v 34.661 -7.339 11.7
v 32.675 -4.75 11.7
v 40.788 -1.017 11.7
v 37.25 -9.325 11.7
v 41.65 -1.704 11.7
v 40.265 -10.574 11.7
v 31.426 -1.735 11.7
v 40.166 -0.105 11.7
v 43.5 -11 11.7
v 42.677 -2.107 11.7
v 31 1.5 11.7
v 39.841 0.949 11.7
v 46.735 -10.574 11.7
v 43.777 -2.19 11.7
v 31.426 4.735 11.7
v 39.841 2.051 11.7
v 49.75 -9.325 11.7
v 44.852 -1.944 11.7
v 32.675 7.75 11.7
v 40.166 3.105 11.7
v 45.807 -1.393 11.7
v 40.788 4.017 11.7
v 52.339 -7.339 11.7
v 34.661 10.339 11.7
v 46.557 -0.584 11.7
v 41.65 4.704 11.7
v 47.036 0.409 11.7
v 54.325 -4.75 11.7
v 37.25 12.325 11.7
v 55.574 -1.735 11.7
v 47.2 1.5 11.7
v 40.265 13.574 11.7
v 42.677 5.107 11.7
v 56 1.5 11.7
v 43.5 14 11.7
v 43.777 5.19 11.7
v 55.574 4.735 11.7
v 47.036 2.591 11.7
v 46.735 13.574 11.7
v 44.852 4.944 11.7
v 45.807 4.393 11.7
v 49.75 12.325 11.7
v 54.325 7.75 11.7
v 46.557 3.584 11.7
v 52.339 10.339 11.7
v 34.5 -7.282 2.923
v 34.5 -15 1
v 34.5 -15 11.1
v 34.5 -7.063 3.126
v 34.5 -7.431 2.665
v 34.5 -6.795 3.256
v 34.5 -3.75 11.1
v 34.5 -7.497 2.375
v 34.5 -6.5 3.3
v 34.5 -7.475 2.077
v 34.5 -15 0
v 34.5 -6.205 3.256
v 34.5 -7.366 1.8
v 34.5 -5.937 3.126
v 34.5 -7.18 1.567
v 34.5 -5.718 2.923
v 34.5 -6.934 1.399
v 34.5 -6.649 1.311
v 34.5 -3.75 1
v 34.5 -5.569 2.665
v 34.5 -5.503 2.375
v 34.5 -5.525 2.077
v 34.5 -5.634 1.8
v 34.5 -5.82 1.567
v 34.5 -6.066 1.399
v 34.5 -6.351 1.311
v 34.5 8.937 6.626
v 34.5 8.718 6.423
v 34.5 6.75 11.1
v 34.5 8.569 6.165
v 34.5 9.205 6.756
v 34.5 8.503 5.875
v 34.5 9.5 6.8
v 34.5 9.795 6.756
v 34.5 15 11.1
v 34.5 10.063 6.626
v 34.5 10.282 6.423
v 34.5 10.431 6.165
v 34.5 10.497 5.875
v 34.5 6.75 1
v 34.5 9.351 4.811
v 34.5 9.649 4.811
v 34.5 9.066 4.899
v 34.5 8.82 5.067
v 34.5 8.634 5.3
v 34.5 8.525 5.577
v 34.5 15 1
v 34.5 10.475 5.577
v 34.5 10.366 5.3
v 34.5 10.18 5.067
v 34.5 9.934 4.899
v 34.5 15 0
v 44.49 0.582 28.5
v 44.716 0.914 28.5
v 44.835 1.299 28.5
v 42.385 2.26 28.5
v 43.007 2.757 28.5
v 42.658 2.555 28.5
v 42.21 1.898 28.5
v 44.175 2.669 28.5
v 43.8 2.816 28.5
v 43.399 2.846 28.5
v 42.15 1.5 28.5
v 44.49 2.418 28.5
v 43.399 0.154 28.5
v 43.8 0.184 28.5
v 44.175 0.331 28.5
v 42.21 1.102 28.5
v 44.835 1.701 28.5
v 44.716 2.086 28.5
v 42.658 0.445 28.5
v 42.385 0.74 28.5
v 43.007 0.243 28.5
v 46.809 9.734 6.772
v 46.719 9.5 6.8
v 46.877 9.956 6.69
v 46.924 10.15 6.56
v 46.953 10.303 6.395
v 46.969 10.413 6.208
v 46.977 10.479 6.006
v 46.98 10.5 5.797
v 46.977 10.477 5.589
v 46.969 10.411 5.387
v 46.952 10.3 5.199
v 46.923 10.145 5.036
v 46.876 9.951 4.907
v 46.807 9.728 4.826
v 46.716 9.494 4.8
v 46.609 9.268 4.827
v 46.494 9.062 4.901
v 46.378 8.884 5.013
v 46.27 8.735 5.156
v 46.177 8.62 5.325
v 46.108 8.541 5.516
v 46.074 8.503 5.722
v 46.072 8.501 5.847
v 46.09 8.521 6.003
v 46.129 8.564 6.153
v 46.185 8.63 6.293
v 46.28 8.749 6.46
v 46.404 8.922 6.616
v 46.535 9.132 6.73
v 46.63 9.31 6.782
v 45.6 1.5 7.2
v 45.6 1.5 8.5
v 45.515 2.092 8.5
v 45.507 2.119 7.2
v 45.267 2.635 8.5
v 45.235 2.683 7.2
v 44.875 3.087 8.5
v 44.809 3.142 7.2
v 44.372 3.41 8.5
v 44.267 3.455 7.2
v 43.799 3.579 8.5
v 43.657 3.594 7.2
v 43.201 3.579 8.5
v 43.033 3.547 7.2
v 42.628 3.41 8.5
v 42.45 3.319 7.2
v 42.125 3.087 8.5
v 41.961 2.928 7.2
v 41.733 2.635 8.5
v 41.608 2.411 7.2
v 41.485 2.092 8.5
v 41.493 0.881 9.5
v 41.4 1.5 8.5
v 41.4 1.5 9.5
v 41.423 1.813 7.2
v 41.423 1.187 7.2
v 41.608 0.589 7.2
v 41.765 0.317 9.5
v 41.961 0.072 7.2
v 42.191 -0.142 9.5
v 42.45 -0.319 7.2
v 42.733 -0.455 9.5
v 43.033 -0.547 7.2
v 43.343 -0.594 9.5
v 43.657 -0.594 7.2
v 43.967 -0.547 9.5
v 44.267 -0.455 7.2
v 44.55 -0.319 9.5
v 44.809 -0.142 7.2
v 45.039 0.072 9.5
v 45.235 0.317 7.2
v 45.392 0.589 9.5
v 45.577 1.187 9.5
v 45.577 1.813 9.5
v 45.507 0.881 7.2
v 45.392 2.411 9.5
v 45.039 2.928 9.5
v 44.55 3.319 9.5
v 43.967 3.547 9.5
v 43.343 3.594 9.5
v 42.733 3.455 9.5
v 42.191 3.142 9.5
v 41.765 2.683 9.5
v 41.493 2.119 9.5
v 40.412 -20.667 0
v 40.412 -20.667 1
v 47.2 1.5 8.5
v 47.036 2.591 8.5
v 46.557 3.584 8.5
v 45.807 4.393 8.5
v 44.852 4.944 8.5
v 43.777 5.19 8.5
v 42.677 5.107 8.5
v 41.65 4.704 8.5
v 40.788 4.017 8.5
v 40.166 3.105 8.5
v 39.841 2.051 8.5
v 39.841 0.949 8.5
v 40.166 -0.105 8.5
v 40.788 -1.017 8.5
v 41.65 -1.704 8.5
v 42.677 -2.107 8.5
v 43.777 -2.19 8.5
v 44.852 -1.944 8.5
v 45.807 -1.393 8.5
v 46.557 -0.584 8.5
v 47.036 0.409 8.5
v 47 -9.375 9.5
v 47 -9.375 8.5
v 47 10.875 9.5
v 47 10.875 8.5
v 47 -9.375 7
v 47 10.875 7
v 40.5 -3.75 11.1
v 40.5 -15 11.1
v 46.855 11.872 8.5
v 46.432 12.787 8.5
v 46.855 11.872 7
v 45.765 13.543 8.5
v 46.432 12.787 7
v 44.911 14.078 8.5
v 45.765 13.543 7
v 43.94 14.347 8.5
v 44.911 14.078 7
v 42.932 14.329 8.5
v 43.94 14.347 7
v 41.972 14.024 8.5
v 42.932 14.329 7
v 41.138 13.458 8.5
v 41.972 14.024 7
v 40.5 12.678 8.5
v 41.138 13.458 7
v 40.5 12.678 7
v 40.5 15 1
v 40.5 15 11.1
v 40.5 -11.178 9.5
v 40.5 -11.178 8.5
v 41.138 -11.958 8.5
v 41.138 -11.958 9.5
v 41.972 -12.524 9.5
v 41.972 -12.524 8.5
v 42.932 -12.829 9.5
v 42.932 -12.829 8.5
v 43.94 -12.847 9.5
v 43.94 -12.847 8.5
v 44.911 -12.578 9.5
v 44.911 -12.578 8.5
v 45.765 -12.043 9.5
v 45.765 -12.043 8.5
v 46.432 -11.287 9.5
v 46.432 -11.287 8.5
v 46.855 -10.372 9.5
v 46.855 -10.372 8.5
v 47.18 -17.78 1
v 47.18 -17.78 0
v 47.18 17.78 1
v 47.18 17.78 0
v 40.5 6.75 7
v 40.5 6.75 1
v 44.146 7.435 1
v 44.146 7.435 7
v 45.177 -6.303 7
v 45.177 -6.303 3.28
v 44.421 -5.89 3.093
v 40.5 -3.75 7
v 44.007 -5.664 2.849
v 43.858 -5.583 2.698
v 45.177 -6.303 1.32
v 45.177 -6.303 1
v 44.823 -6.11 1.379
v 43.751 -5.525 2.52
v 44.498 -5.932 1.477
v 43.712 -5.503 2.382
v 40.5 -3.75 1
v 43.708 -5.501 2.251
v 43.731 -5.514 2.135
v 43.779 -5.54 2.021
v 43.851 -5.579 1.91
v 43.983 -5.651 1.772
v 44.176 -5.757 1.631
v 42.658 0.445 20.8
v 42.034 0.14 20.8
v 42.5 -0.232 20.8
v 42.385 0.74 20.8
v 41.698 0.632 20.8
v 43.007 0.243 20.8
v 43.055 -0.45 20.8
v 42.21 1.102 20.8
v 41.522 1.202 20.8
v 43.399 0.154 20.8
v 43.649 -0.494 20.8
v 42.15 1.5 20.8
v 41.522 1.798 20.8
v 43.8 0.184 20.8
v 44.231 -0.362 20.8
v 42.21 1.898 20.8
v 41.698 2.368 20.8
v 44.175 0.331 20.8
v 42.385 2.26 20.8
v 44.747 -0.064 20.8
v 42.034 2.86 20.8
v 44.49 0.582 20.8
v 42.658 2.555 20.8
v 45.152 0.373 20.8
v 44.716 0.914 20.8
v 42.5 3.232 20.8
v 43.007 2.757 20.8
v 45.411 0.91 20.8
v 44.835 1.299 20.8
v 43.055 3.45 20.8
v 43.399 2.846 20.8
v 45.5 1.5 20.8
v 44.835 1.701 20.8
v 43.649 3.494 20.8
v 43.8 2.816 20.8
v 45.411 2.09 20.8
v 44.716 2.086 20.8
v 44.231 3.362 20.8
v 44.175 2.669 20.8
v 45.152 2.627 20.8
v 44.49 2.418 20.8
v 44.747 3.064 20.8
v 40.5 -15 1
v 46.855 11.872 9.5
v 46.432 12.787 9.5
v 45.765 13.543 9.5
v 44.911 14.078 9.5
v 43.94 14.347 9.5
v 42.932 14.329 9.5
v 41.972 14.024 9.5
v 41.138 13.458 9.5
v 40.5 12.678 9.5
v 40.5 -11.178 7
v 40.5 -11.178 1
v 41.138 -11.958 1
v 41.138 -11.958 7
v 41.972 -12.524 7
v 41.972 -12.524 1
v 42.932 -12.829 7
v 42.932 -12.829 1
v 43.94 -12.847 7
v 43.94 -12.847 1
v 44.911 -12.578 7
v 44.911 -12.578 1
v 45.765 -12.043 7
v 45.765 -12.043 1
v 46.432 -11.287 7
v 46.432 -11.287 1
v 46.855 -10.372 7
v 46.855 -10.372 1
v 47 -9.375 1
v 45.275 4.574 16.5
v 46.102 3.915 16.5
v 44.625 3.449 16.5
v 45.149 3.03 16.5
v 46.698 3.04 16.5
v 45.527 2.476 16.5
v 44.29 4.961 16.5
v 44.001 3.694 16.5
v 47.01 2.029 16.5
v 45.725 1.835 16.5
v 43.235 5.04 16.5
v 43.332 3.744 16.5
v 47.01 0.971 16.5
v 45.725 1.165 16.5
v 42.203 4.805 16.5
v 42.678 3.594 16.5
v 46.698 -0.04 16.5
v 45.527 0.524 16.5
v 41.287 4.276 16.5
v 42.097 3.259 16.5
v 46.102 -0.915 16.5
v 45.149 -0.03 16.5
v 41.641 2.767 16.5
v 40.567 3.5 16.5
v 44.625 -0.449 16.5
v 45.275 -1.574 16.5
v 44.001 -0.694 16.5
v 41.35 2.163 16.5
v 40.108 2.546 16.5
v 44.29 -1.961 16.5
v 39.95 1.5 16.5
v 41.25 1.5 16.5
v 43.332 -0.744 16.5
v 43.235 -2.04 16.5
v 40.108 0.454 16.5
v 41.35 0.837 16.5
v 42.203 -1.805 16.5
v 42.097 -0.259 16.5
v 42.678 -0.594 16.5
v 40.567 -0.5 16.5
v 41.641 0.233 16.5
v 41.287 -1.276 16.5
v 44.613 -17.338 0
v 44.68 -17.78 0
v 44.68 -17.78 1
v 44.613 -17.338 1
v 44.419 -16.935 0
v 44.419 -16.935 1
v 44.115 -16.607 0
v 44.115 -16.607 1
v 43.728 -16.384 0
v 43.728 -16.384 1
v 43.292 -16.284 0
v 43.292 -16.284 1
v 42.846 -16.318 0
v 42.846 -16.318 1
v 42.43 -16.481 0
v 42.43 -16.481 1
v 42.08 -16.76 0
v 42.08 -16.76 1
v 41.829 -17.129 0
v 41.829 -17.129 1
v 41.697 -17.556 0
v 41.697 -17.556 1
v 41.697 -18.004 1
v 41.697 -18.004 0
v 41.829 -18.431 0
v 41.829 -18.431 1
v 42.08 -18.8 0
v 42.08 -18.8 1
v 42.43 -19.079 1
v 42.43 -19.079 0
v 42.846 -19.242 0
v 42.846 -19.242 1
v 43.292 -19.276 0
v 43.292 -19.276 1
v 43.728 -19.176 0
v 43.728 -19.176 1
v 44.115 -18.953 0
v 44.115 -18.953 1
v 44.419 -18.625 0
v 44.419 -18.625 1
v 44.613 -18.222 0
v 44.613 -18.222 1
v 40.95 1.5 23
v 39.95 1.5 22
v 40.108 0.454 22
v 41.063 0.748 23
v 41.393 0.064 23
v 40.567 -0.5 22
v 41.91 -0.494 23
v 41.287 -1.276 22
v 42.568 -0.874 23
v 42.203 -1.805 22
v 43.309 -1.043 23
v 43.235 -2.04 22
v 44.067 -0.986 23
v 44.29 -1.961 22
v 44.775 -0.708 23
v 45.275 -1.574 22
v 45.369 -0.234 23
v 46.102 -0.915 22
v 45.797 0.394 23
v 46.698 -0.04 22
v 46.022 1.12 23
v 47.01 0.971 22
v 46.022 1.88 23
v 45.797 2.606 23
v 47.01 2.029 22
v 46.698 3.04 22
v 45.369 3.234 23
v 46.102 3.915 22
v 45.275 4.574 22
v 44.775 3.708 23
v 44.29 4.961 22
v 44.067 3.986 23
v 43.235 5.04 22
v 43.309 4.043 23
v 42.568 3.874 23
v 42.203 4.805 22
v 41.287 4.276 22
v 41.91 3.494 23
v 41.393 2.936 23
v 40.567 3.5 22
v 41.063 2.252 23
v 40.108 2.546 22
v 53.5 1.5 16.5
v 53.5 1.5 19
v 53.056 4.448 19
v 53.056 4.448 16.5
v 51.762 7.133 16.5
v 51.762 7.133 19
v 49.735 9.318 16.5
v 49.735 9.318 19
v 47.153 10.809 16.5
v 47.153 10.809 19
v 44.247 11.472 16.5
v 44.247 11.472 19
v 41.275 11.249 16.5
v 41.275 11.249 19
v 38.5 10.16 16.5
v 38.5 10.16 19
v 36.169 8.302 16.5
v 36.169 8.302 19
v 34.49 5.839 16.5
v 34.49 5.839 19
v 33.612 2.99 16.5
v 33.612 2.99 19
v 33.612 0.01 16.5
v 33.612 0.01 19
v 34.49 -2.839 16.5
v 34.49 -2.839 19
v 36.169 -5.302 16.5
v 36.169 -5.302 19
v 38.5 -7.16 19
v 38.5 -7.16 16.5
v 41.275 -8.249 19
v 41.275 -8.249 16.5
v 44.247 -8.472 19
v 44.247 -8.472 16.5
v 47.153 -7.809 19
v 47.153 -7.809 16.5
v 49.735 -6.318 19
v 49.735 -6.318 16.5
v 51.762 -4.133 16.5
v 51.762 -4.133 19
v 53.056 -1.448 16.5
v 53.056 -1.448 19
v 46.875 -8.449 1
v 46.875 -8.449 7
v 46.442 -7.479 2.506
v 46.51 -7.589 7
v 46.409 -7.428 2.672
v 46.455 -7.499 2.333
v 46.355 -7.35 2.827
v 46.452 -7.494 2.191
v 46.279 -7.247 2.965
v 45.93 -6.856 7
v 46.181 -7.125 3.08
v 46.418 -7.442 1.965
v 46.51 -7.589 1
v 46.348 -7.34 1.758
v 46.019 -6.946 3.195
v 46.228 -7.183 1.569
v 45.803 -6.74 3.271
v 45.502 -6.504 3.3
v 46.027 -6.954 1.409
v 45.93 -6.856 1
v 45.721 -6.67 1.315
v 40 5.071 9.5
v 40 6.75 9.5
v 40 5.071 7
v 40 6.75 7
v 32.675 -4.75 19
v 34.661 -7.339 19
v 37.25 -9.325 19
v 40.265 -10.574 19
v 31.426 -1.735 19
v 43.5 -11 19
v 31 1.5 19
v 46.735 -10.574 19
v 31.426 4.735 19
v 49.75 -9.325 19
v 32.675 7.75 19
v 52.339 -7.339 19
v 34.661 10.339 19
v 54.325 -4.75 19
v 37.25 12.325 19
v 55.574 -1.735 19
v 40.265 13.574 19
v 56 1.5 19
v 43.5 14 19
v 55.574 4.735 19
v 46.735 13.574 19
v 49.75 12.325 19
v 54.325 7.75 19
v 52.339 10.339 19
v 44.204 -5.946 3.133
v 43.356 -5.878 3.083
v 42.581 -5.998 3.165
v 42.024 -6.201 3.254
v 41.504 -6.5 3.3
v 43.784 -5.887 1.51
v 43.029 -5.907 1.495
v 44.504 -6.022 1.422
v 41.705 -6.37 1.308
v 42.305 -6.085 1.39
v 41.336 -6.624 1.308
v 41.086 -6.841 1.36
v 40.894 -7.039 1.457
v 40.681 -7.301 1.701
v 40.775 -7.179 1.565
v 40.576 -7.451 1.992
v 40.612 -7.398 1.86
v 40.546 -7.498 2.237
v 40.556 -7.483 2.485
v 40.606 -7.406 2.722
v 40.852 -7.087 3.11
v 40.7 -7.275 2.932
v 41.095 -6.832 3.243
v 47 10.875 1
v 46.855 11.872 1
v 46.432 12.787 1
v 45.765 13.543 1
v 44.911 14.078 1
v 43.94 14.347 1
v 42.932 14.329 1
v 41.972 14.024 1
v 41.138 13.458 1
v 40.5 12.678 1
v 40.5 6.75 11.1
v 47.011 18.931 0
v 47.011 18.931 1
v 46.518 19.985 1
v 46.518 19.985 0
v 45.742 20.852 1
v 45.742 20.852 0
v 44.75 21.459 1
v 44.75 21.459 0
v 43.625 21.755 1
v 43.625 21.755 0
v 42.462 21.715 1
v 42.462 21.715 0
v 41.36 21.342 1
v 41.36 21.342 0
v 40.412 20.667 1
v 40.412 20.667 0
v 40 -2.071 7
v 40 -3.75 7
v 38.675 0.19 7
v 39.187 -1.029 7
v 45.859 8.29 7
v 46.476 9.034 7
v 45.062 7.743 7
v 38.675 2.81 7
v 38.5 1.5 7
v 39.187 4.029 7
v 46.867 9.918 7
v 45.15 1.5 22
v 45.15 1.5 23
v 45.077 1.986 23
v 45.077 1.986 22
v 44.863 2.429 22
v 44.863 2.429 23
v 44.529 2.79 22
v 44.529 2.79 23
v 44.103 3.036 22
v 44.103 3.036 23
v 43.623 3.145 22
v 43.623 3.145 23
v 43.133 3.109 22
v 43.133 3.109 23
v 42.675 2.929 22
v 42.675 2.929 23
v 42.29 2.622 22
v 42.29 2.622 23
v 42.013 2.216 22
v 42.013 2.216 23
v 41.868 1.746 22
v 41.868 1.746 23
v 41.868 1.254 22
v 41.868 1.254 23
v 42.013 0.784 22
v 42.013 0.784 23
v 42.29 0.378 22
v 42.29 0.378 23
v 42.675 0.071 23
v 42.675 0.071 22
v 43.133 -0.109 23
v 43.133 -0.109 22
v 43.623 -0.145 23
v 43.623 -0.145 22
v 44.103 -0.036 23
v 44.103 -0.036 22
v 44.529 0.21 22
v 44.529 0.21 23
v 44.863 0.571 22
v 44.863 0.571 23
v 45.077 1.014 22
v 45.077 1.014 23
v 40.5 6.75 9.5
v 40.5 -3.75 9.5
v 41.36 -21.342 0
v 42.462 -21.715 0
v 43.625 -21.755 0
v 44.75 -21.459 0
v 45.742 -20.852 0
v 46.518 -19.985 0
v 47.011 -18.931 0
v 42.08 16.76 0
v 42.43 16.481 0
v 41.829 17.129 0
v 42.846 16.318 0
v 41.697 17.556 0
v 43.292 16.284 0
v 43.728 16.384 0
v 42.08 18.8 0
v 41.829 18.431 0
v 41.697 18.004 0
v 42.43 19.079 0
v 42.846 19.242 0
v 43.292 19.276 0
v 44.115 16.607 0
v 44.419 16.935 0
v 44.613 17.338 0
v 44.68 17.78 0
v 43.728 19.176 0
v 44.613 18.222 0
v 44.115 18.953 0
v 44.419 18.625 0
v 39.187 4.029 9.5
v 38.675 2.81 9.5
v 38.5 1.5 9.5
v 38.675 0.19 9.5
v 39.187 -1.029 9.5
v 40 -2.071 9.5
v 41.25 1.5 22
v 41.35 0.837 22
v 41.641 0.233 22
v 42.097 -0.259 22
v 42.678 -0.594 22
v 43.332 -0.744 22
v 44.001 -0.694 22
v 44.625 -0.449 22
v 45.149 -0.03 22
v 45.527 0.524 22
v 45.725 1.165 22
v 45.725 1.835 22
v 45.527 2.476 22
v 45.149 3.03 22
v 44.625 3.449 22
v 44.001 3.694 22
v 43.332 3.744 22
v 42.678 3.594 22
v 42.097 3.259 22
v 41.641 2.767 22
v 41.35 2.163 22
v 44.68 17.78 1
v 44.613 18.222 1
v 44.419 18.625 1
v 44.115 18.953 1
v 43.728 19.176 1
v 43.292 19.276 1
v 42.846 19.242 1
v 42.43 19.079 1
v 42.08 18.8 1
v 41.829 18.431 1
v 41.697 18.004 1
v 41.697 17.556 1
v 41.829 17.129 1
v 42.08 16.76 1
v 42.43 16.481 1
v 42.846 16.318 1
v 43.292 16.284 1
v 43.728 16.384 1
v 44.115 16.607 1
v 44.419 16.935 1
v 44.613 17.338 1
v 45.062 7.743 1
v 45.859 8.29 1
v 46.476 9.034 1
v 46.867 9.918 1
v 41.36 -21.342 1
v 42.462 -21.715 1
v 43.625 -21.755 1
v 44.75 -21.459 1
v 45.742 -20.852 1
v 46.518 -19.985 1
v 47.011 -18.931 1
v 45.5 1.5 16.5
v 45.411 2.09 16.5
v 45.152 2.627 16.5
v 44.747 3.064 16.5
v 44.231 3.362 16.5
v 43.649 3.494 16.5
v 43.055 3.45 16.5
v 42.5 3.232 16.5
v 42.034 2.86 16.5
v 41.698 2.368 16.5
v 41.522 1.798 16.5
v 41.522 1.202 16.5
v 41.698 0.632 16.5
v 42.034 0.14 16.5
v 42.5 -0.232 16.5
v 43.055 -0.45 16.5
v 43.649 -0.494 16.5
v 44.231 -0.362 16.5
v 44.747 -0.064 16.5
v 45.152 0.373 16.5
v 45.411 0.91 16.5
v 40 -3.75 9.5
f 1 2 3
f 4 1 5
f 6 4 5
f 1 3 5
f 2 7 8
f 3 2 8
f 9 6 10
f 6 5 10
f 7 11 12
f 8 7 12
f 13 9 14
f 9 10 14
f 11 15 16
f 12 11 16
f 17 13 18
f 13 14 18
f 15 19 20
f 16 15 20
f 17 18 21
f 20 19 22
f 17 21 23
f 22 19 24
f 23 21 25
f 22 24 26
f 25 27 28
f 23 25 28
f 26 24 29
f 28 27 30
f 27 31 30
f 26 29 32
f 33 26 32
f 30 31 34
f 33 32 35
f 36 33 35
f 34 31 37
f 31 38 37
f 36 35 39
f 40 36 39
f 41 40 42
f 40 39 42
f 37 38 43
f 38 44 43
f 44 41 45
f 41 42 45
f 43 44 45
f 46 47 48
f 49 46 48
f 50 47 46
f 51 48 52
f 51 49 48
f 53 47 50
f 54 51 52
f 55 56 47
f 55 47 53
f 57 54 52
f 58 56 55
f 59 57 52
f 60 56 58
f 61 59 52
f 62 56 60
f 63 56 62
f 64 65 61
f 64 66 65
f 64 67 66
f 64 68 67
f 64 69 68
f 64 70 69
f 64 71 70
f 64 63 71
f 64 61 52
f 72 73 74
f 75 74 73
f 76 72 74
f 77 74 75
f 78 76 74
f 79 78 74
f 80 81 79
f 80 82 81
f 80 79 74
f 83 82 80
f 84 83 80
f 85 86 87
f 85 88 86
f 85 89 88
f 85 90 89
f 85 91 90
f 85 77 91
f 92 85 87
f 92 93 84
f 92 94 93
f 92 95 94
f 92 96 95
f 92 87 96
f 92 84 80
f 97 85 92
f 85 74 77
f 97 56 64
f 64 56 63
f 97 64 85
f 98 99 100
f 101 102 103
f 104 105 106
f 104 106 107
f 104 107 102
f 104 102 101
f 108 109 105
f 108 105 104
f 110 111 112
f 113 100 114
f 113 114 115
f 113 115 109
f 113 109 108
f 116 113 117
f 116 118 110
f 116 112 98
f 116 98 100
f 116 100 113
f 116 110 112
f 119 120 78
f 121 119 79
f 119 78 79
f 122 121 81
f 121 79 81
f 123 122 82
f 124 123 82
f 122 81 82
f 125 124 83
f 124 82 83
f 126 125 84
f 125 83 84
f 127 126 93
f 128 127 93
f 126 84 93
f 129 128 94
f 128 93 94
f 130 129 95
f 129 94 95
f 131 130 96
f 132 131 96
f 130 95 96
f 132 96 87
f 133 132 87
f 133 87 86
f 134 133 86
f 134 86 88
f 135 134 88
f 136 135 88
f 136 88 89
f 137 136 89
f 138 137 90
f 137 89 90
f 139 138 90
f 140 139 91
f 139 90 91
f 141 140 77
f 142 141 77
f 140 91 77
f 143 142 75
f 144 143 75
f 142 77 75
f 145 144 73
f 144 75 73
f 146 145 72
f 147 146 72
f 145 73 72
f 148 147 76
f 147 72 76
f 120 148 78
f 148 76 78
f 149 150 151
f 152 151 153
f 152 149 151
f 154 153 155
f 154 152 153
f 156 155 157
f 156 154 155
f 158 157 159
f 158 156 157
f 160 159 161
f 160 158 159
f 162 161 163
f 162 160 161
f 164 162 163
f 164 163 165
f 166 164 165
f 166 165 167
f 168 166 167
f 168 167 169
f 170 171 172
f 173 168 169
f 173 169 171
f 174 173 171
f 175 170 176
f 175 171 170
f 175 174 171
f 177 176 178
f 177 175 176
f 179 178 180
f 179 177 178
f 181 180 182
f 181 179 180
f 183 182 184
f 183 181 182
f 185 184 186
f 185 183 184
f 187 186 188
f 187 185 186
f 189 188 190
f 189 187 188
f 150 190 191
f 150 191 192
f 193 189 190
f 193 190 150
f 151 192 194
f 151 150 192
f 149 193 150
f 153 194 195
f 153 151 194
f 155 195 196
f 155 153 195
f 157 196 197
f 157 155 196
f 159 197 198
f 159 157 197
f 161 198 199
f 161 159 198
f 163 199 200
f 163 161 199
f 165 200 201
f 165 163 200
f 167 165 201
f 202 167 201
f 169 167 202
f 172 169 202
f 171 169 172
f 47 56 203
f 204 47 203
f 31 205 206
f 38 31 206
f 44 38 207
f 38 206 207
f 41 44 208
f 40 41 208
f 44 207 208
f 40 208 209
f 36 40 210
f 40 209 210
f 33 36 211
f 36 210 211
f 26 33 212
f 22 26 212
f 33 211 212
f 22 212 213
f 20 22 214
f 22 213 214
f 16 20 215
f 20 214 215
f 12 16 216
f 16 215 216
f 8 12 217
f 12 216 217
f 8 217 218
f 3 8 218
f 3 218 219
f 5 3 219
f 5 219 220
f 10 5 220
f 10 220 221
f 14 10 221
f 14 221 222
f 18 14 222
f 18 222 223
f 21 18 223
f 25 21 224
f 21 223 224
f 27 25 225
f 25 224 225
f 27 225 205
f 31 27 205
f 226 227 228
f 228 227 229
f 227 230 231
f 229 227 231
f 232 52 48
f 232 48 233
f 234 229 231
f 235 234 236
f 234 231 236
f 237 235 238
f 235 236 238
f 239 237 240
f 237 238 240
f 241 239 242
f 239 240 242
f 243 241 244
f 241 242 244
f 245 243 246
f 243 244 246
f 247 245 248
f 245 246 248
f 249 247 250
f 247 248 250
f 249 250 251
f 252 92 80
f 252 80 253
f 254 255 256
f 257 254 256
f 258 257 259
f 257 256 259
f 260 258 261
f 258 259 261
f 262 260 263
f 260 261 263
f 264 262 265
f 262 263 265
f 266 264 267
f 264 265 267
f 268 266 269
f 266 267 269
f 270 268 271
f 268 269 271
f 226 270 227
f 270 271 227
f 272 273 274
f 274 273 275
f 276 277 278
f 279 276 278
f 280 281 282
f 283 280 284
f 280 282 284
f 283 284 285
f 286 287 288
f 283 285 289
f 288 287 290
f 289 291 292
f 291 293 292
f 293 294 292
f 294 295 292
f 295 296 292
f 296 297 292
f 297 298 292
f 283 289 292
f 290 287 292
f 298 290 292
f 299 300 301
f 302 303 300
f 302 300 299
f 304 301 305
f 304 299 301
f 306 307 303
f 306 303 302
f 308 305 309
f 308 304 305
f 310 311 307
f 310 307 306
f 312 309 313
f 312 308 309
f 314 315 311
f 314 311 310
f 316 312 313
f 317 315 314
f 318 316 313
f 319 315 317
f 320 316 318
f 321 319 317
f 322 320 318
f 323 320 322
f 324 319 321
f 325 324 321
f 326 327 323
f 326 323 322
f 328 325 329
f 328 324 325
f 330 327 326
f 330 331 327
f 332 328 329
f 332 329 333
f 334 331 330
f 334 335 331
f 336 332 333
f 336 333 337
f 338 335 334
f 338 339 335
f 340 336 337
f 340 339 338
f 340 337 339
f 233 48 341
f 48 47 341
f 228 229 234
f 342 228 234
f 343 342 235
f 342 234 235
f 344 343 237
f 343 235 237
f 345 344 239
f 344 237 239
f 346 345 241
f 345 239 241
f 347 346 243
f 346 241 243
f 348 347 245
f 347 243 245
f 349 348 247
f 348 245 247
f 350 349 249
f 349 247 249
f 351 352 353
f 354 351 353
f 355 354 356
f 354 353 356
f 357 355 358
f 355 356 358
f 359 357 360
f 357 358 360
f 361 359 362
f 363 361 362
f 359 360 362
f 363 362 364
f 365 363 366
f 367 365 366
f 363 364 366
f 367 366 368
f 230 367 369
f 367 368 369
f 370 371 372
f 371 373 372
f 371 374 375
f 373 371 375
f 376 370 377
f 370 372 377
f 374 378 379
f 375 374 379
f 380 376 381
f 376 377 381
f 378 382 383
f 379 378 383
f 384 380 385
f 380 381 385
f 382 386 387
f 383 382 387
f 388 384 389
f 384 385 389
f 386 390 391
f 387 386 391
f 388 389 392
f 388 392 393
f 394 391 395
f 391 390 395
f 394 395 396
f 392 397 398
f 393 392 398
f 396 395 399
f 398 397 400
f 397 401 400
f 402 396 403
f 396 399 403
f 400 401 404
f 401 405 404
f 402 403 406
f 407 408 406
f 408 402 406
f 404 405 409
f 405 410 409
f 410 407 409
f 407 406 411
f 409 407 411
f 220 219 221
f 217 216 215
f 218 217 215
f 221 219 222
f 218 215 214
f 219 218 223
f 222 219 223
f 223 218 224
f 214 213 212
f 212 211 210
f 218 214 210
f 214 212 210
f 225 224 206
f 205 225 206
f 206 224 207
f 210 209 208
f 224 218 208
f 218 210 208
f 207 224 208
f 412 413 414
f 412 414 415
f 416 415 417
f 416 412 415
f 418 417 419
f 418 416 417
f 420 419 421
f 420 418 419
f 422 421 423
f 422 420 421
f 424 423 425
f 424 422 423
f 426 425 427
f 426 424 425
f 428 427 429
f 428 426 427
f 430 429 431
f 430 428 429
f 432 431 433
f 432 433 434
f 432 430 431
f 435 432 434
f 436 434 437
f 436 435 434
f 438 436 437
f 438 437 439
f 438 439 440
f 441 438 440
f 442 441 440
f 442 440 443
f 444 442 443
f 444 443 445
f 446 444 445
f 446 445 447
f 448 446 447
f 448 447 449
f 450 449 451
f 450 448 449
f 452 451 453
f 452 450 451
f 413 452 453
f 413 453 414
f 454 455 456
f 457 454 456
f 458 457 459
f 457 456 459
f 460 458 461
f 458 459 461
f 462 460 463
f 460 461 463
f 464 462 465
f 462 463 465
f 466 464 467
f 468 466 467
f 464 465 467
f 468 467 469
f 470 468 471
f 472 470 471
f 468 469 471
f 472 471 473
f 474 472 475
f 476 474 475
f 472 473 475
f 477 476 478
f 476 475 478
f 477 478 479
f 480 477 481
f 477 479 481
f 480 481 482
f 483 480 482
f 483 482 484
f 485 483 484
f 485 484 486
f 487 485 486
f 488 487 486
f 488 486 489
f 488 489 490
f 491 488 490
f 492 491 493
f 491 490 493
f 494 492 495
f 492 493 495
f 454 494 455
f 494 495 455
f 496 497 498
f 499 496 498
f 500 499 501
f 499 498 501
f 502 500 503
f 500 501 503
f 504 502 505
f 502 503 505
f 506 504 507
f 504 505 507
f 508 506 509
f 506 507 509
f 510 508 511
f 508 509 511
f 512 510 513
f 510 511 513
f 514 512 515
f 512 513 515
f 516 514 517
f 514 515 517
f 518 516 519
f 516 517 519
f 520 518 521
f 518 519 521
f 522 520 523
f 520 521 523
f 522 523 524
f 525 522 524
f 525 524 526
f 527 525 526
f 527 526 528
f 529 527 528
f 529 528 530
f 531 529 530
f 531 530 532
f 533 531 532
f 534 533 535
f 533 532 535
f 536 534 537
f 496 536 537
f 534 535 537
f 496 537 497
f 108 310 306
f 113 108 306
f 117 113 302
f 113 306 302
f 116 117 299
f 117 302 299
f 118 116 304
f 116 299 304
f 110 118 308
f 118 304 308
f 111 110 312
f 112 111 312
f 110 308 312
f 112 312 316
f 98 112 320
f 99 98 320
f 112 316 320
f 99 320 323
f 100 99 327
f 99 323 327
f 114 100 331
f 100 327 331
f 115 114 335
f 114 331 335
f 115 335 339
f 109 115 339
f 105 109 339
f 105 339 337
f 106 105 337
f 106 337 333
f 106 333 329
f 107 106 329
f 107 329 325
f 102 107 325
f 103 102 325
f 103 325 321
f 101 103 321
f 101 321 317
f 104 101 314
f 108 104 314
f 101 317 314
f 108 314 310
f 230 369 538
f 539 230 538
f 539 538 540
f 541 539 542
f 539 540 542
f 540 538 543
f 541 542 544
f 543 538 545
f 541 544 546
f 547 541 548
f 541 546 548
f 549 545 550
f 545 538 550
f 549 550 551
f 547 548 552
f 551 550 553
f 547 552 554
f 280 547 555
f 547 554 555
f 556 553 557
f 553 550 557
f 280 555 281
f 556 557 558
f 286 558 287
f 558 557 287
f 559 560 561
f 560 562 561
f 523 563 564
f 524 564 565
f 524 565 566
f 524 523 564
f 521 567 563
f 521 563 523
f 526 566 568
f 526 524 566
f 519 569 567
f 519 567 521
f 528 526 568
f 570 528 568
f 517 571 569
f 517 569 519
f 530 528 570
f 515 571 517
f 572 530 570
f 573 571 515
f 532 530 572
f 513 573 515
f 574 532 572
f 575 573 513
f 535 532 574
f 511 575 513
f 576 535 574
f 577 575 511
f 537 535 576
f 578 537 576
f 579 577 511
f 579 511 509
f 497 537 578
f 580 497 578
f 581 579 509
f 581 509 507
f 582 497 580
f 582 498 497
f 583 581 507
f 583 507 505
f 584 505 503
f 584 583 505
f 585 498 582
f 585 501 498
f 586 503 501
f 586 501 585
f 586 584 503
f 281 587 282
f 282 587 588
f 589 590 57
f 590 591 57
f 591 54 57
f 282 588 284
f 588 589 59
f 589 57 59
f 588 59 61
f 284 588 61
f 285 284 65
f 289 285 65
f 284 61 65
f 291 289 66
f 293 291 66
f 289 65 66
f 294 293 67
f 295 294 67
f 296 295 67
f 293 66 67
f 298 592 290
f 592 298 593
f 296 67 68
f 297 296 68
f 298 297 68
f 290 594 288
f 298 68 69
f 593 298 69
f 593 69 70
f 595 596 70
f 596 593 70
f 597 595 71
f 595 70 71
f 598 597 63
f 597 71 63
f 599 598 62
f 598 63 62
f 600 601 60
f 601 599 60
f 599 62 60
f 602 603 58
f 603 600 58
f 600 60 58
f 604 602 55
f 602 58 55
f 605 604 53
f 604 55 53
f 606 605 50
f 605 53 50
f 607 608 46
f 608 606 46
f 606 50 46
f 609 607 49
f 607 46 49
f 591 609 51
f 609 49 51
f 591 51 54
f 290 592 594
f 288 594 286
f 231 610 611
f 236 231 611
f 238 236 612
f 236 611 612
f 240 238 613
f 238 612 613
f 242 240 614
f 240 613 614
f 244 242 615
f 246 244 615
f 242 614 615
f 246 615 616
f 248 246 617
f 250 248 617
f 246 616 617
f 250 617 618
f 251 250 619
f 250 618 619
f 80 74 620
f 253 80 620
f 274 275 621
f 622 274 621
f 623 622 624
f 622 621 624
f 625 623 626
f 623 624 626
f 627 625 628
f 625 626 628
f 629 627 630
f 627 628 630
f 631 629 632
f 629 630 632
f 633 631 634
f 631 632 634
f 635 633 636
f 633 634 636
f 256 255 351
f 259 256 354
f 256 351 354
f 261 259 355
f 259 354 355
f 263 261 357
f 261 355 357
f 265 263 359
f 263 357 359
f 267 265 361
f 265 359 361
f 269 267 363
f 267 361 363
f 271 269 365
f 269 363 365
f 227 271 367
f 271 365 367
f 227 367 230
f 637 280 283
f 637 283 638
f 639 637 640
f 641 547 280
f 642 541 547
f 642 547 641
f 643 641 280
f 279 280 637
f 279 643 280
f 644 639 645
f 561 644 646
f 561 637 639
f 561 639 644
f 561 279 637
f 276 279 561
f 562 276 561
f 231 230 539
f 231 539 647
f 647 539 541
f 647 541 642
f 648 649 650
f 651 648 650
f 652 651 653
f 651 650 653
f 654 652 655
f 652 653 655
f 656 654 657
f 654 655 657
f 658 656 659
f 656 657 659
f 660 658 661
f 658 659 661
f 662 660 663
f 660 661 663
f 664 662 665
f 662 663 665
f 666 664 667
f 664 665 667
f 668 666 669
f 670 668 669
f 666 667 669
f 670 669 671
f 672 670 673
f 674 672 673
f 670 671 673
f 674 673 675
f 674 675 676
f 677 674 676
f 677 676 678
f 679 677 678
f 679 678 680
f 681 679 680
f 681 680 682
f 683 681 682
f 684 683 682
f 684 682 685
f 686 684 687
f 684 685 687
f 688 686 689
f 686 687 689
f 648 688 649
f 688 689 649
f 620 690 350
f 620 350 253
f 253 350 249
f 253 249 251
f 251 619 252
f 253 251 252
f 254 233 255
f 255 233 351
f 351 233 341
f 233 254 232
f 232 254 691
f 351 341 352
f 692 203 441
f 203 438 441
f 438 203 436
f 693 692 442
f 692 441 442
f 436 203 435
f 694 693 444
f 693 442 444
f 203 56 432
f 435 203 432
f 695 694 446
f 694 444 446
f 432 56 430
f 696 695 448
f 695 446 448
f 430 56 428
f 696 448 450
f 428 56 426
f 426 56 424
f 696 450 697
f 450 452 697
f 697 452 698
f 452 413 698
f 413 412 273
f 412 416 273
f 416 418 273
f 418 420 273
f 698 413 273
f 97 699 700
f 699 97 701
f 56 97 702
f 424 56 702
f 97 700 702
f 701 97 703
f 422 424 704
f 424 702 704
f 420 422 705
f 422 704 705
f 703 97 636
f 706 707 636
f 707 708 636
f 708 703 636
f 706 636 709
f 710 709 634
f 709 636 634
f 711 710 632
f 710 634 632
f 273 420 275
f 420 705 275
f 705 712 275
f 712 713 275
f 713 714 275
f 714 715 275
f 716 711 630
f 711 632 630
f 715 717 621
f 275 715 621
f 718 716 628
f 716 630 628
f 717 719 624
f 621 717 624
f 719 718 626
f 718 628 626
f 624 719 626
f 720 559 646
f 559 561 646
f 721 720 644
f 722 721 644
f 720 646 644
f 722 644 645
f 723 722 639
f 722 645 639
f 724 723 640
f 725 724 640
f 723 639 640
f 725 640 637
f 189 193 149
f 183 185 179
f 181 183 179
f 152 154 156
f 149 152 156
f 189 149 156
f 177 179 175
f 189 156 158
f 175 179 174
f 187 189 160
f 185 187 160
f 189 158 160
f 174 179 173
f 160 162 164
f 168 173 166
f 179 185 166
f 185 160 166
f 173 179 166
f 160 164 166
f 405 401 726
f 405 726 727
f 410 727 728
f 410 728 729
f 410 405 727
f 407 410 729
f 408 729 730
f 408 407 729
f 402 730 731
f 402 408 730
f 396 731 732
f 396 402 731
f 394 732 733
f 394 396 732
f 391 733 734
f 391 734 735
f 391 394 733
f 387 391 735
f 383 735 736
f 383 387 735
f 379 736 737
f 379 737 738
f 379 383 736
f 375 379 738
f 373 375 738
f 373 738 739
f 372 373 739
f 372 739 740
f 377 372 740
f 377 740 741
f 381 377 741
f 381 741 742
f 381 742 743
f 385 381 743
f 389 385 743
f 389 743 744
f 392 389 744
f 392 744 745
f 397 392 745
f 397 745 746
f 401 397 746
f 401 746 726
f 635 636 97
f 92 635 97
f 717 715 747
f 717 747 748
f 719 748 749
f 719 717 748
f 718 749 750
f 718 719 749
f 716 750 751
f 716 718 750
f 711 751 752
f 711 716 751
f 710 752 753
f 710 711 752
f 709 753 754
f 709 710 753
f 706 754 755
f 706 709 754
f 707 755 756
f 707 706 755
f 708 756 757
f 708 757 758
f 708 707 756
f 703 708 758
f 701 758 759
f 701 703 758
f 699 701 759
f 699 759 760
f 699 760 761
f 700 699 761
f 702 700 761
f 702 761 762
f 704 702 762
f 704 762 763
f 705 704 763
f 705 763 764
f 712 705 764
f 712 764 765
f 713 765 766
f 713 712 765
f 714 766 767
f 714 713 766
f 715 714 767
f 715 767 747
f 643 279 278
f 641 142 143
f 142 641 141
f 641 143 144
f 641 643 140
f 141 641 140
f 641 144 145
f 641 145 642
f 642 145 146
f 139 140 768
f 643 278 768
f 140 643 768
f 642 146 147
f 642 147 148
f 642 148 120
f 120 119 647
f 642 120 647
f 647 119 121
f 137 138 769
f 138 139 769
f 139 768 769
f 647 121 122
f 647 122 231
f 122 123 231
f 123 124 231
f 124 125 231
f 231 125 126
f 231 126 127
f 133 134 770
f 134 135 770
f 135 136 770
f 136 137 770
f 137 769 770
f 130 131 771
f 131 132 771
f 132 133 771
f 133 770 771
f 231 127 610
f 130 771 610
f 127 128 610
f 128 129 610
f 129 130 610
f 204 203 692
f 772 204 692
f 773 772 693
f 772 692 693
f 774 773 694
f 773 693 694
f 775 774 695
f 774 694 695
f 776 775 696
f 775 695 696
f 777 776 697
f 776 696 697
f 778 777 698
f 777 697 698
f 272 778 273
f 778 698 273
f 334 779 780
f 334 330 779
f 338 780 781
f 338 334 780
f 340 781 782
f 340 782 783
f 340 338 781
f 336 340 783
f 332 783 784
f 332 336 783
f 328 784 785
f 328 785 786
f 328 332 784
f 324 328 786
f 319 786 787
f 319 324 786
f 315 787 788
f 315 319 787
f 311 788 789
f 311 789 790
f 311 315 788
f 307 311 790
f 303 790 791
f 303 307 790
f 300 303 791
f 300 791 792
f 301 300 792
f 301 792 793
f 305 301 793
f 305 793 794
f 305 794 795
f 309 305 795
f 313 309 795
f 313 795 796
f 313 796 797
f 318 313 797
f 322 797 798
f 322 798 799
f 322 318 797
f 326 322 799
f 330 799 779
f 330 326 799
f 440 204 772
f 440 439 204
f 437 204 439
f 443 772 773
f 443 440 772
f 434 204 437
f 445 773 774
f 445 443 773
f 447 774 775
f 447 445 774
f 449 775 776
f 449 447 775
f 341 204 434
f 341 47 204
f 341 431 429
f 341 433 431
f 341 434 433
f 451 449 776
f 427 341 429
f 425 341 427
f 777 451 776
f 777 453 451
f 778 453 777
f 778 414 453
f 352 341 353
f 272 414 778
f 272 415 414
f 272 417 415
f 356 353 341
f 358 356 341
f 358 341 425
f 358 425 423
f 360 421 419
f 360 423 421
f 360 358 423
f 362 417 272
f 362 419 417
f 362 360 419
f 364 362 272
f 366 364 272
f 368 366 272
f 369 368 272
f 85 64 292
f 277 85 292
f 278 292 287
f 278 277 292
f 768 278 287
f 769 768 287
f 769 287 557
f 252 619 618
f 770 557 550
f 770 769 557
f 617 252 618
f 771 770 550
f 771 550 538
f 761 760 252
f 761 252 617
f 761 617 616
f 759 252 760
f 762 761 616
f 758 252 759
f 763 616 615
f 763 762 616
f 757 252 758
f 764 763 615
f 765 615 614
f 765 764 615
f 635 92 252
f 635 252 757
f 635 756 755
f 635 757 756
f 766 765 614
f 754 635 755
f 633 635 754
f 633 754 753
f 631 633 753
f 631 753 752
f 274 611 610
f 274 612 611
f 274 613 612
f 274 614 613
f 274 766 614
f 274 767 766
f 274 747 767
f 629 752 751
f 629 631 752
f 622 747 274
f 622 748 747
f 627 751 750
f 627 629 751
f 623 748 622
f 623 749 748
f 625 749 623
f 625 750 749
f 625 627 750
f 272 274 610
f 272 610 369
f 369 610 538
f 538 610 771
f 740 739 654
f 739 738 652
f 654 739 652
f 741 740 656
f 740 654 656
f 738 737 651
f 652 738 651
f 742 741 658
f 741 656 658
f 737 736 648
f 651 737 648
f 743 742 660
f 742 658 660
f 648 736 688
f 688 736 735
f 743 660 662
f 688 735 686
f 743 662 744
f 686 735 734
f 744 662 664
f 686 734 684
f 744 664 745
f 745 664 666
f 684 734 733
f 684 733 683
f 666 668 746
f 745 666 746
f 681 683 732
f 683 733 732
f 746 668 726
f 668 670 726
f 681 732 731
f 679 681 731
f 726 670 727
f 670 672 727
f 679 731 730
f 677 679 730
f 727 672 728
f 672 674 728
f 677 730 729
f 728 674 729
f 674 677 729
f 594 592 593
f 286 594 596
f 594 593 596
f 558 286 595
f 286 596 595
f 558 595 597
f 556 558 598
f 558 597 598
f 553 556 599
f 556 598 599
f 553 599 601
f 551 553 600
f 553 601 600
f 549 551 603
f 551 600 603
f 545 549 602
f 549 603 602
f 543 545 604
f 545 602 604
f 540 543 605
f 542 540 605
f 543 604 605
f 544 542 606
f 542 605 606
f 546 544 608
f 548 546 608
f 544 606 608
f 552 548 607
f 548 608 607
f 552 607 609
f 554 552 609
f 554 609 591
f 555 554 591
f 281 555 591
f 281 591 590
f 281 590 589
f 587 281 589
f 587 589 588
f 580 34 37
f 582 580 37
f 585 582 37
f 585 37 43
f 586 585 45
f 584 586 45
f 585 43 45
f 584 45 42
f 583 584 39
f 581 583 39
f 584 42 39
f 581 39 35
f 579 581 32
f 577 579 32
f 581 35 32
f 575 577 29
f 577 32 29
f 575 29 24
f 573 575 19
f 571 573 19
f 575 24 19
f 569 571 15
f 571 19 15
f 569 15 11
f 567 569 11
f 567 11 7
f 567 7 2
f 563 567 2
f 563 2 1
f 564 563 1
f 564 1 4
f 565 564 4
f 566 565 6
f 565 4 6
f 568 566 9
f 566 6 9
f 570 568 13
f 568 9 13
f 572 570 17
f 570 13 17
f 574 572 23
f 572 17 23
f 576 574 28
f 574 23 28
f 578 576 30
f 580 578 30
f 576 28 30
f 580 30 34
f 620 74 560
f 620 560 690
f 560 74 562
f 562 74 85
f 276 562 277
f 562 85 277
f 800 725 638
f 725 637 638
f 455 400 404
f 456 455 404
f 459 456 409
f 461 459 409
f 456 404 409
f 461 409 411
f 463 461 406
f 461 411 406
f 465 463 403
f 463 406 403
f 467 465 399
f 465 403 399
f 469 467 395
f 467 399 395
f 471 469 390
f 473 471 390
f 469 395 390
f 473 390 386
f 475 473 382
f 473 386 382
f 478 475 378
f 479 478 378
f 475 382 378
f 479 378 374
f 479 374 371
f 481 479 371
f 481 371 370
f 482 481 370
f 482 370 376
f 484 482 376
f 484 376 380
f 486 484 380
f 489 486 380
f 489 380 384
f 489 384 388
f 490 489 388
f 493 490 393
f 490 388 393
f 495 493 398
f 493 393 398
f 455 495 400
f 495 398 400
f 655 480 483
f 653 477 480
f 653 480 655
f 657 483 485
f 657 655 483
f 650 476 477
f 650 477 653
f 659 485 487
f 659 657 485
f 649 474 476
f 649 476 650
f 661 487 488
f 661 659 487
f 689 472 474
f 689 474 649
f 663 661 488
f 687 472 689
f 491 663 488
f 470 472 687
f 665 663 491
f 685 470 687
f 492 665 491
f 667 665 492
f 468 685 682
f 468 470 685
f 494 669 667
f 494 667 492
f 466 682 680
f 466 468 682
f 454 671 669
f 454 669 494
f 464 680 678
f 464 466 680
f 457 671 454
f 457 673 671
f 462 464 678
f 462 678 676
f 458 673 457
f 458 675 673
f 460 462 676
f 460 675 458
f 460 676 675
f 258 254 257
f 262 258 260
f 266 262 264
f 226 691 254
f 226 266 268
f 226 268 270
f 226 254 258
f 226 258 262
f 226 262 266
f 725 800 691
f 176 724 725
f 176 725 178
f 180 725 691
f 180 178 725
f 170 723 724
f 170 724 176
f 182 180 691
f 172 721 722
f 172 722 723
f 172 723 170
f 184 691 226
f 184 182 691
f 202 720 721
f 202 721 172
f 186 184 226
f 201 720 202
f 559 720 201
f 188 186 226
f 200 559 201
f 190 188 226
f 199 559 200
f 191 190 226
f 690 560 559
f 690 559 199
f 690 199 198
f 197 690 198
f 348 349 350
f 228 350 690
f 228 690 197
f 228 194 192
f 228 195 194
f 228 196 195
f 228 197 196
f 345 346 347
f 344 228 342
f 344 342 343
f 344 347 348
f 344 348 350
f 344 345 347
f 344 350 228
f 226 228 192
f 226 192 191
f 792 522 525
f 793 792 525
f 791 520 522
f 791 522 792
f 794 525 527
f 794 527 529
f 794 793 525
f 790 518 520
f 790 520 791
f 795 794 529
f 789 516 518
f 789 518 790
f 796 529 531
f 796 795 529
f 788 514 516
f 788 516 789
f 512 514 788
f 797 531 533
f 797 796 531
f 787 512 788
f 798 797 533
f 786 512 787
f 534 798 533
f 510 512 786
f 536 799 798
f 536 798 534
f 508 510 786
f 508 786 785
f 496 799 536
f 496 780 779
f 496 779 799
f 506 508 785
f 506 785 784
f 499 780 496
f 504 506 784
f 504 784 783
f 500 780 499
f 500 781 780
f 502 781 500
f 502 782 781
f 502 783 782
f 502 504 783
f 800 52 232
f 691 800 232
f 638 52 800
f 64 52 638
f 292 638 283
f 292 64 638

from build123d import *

# Parameters (mm, degrees)
SKETCH1_R            = 4
SKETCH1_R_2          = 1.5
BOSS_EXTRUDE1_DEPTH  = 1
BOSS_EXTRUDE2_START  = -1
BOSS_EXTRUDE2_DEPTH  = 1
SKETCH3_W            = 6
SKETCH3_H            = 8.25
SKETCH3_H_2          = 11.25
BOSS_EXTRUDE3_DEPTH  = 7.1
BOSS_EXTRUDE4_DEPTH  = 6
SKETCH5_R            = 3.5
BOSS_EXTRUDE5_DEPTH  = 1.5
SKETCH4_3_R          = 2.1
CUT_EXTRUDE1_DEPTH   = 12
SKETCH6_R            = 1
CUT_EXTRUDE2_DEPTH   = 13
SKETCH7_R            = 3.7
BOSS_EXTRUDE6_DEPTH  = 3.2
SKETCH8_R            = 12.5
BOSS_EXTRUDE7_DEPTH  = 7.3
SKETCH9_R            = 2
BOSS_EXTRUDE8_DEPTH  = 1.8
SKETCH10_R           = 1.35
BOSS_EXTRUDE9_DEPTH  = 7.7
BOSS_EXTRUDE10_DEPTH = 2
BOSS_EXTRUDE11_DEPTH = 6
SKETCH14_R           = 1
CUT_EXTRUDE3_DEPTH   = 42.819473933
BOSS_EXTRUDE12_DEPTH = 1.5
SKETCH16_R           = 2.1
BOSS_EXTRUDE13_DEPTH = 0.2
SKETCH17_R           = 2.1
BOSS_EXTRUDE14_DEPTH = 1
SKETCH18_W           = 6
SKETCH18_H           = 11.25
SKETCH18_H_2         = 8.25
BOSS_EXTRUDE15_DEPTH = 1
SKETCH19_R           = 10
SKETCH19_R_2         = 2
CUT_EXTRUDE4_DEPTH   = 2.5
SKETCH20_R           = 3.55
SKETCH20_R_2         = 2.25
BOSS_EXTRUDE16_DEPTH = 6.5
SKETCH21_R           = 2.25
SKETCH21_R_2         = 1.65
BOSS_EXTRUDE17_DEPTH = 1
CHAMFER1_SIZE        = 1


with BuildPart() as part:
    # Sketch1 → Boss-Extrude1 (new body)
    # profile 1 of 3: a face of its own
    with BuildSketch(Plane.XY):
        with BuildLine():
            Line((47.18, -17.78), (47.18, 17.78))
            ThreePointArc((47.18, 17.78), (43.18, 13.78), (39.18, 17.78))
            Line((39.18, 17.78), (39.18, -17.78))
            ThreePointArc((39.18, -17.78), (43.18, -13.78), (47.18, -17.78))
        make_face()
    # profile 2 of 3: a face of its own
    with BuildSketch(Plane.XY):
        with Locations((43.18, 17.78)):
            Circle(SKETCH1_R)
        with Locations((43.18, 17.78)):
            Circle(SKETCH1_R_2, mode=Mode.SUBTRACT)
    # profile 3 of 3: a face of its own
    with BuildSketch(Plane.XY):
        with Locations((43.18, -17.78)):
            Circle(SKETCH1_R)
        with Locations((43.18, -17.78)):
            Circle(SKETCH1_R_2, mode=Mode.SUBTRACT)
    extrude(amount=BOSS_EXTRUDE1_DEPTH)

    # Sketch2 → Boss-Extrude2 (add)
    with BuildSketch(Plane.XY.offset(1).offset(BOSS_EXTRUDE2_START)):
        with BuildLine():
            ThreePointArc((39.18, 17.78), (39.500839476, 19.349642584), (40.41188892, 20.667483515))
            Line((40.41188892, 20.667483515), (34.5, 15))
            Line((34.5, 15), (34.5, 0))
            Line((34.5, 0), (39.18, 0))
            Line((39.18, 0), (39.18, 17.78))
        make_face()
        with BuildLine():
            Line((39.18, 0), (34.5, 0))
            Line((34.5, 0), (34.5, -15))
            Line((34.5, -15), (40.41188892, -20.667483515))
            ThreePointArc((40.41188892, -20.667483515), (39.500839476, -19.349642584), (39.18, -17.78))
            Line((39.18, -17.78), (39.18, 0))
        make_face()
    extrude(amount=BOSS_EXTRUDE2_DEPTH)

    # Sketch3 → Boss-Extrude3 (add)
    with BuildSketch(Plane.XY.offset(1)):
        with Locations((37.5, 10.875)):
            Rectangle(SKETCH3_W, SKETCH3_H)
        with Locations((37.5, -9.375)):
            Rectangle(SKETCH3_W, SKETCH3_H_2)
    extrude(amount=BOSS_EXTRUDE3_DEPTH)

    # Sketch4 → Boss-Extrude4 (add)
    with BuildSketch(Plane.XY.offset(1)):
        with BuildLine():
            ThreePointArc((40.5, 9.072224362), (44.435414347, 7.502315609), (47, 10.875))
            ThreePointArc((47, 10.875), (44.435414347, 14.247684391), (40.5, 12.677775638))
            Line((40.5, 12.677775638), (40.5, 9.072224362))
        make_face()
        with BuildLine():
            Line((40.5, 9.072224362), (40.5, 12.677775638))
            ThreePointArc((40.5, 12.677775638), (40, 10.875), (40.5, 9.072224362))
        make_face()
        with BuildLine():
            ThreePointArc((40.5, -11.177775638), (44.435414347, -12.747684391), (47, -9.375))
            ThreePointArc((47, -9.375), (44.435414347, -6.002315609), (40.5, -7.572224362))
            Line((40.5, -7.572224362), (40.5, -11.177775638))
        make_face()
        with BuildLine():
            Line((40.5, -11.177775638), (40.5, -7.572224362))
            ThreePointArc((40.5, -7.572224362), (40, -9.375), (40.5, -11.177775638))
        make_face()
    extrude(amount=BOSS_EXTRUDE4_DEPTH)

    # Sketch5 → Boss-Extrude5 (add)
    with BuildSketch(Plane.XY.offset(7)):
        with BuildLine():
            ThreePointArc((40.5, 9.072224362), (47, 10.875), (40.5, 12.677775638))
            Line((40.5, 12.677775638), (40.5, 9.072224362))
        make_face()
        with BuildLine():
            Line((47, -9.375), (47, 10.875))
            ThreePointArc((47, 10.875), (44.435414347, 7.502315609), (40.5, 9.072224362))
            ThreePointArc((40.5, 9.072224362), (40.127315609, 9.939585653), (40, 10.875))
            Line((40, 10.875), (40, -9.375))
            ThreePointArc((40, -9.375), (43.5, -5.875), (47, -9.375))
        make_face()
        with Locations((43.5, -9.375)):
            Circle(SKETCH5_R)
    extrude(amount=BOSS_EXTRUDE5_DEPTH)

    # Sketch4<3> → Cut-Extrude1 (cut)
    with BuildSketch(Plane.XY.offset(1)):
        with Locations((43.5, 1.5)):
            Circle(SKETCH4_3_R)
    extrude(amount=CUT_EXTRUDE1_DEPTH, mode=Mode.SUBTRACT)

    # Sketch6 → Cut-Extrude2 (cut)
    with BuildSketch(Plane.ZY.offset(-34.5)):
        with Locations((5.8, 9.5)):
            Circle(SKETCH6_R)
        with Locations((2.3, -6.5)):
            Circle(SKETCH6_R)
    extrude(amount=-CUT_EXTRUDE2_DEPTH, mode=Mode.SUBTRACT)

    # Sketch11 → Boss-Extrude10 (add)
    with BuildSketch(Plane.XY.offset(8.1)):
        Polygon((40, -3.75), (34.5, -3.75), (34.5, -15), (40, -15), (40, -9.375), align=None)
        with BuildLine():
            Line((40, -9.375), (40, -15))
            Line((40, -15), (40.5, -15))
            Line((40.5, -15), (40.5, -11.177775638))
            ThreePointArc((40.5, -11.177775638), (40.127315609, -10.310414347), (40, -9.375))
        make_face()
        with BuildLine():
            Line((40.5, -3.75), (40, -3.75))
            Line((40, -3.75), (40, -9.375))
            ThreePointArc((40, -9.375), (40.127315609, -10.310414347), (40.5, -11.177775638))
            Line((40.5, -11.177775638), (40.5, -3.75))
        make_face()
        Polygon((34.5, 6.75), (40, 6.75), (40, 10.875), (40, 15), (34.5, 15), align=None)
        with BuildLine():
            Line((40, 10.875), (40, 6.75))
            Line((40, 6.75), (40.5, 6.75))
            Line((40.5, 6.75), (40.5, 9.072224362))
            ThreePointArc((40.5, 9.072224362), (40.127315609, 9.939585653), (40, 10.875))
        make_face()
        with BuildLine():
            Line((40, 15), (40, 10.875))
            ThreePointArc((40, 10.875), (40.127315609, 9.939585653), (40.5, 9.072224362))
            Line((40.5, 9.072224362), (40.5, 12.677775638))
            Line((40.5, 12.677775638), (40.5, 15))
            Line((40.5, 15), (40, 15))
        make_face()
    extrude(amount=BOSS_EXTRUDE10_DEPTH)

    # Sketch13 → Boss-Extrude11 (add)
    with BuildSketch(Plane.XY.offset(1)):
        with BuildLine():
            Line((45.176908715, -6.302870907), (40.5, -3.75))
            Line((40.5, -3.75), (40.5, -7.572224362))
            ThreePointArc((40.5, -7.572224362), (42.58323548, -5.997198523), (45.176908715, -6.302870907))
        make_face()
        with BuildLine():
            Line((40.5, 9.072224362), (40.5, 6.75))
            Line((40.5, 6.75), (44.146384325, 7.43520534))
            ThreePointArc((44.146384325, 7.43520534), (42.066530605, 7.682013077), (40.5, 9.072224362))
        make_face()
    extrude(amount=BOSS_EXTRUDE11_DEPTH)

    # Sketch14 → Cut-Extrude3 (cut, through all)
    with BuildSketch(Plane.ZY.offset(-34.5)):
        with Locations((5.8, 9.5)):
            Circle(SKETCH14_R)
        with Locations((2.3, -6.5)):
            Circle(SKETCH14_R)
    extrude(amount=-CUT_EXTRUDE3_DEPTH, mode=Mode.SUBTRACT)

    # Sketch15 → Boss-Extrude12 (add)
    with BuildSketch(Plane.XY.offset(8.5)):
        with BuildLine():
            Line((40, -2.070714214), (40, 5.070714214))
            ThreePointArc((40, 5.070714214), (38.5, 1.5), (40, -2.070714214))
        make_face()
    extrude(amount=-BOSS_EXTRUDE12_DEPTH)

    # Sketch16 → Boss-Extrude13 (add)
    with BuildSketch(Plane(origin=(0, 0, 7), x_dir=(-1, 0, 0), z_dir=(0, 0, -1))):
        with Locations((-43.5, 1.5)):
            Circle(SKETCH16_R)
    extrude(amount=-BOSS_EXTRUDE13_DEPTH)

    # Sketch17 → Boss-Extrude14 (add)
    with BuildSketch(Plane.XY.offset(8.5)):
        with BuildLine():
            Line((40.5, 12.677775638), (40.5, 6.75))
            Line((40.5, 6.75), (40, 6.75))
            Line((40, 6.75), (40, 5.070714214))
            ThreePointArc((40, 5.070714214), (38.5, 1.5), (40, -2.070714214))
            Line((40, -2.070714214), (40, -3.75))
            Line((40, -3.75), (40.5, -3.75))
            Line((40.5, -3.75), (40.5, -11.177775638))
            ThreePointArc((40.5, -11.177775638), (44.435414347, -12.747684391), (47, -9.375))
            Line((47, -9.375), (47, 10.875))
            ThreePointArc((47, 10.875), (44.435414347, 14.247684391), (40.5, 12.677775638))
        make_face()
        with Locations(Location((43.5, 1.5, 0), (0, 0, 180))):
            Circle(SKETCH17_R, mode=Mode.SUBTRACT)
    extrude(amount=BOSS_EXTRUDE14_DEPTH)

    # Sketch18 → Boss-Extrude15 (add)
    with BuildSketch(Plane.XY.offset(10.1)):
        with Locations((37.5, -9.375)):
            Rectangle(SKETCH18_W, SKETCH18_H)
        with Locations((37.5, 10.875)):
            Rectangle(SKETCH18_W, SKETCH18_H_2)
    extrude(amount=BOSS_EXTRUDE15_DEPTH)


with BuildPart() as body_2:
    # Sketch7 → Boss-Extrude6 (new body)
    with BuildSketch(Plane.XY.offset(8.5)):
        with Locations((43.5, 1.5)):
            Circle(SKETCH7_R)
    extrude(amount=BOSS_EXTRUDE6_DEPTH)

    # Sketch8 → Boss-Extrude7 (add)
    with BuildSketch(Plane.XY.offset(11.7)):
        with Locations((43.5, 1.5)):
            Circle(SKETCH8_R)
    extrude(amount=BOSS_EXTRUDE7_DEPTH)

    # Sketch9 → Boss-Extrude8 (add)
    with BuildSketch(Plane.XY.offset(19)):
        with Locations((43.5, 1.5)):
            Circle(SKETCH9_R)
    extrude(amount=BOSS_EXTRUDE8_DEPTH)

    # Sketch10 → Boss-Extrude9 (add)
    with BuildSketch(Plane.XY.offset(20.8)):
        with Locations(Location((43.5, 1.5, 0), (0, 0, 180))):
            Circle(SKETCH10_R)
    extrude(amount=BOSS_EXTRUDE9_DEPTH)

    # Sketch19 → Cut-Extrude4 (cut)
    with BuildSketch(Plane.XY.offset(19)):
        with Locations((43.5, 1.5)):
            Circle(SKETCH19_R)
        with Locations((43.5, 1.5)):
            Circle(SKETCH19_R_2, mode=Mode.SUBTRACT)
    extrude(amount=-CUT_EXTRUDE4_DEPTH, mode=Mode.SUBTRACT)


with BuildPart() as body_3:
    # Sketch20 → Boss-Extrude16 (new body)
    with BuildSketch(Plane.XY.offset(16.5)):
        with Locations(Location((43.5, 1.5, 0), (0, 0, 180))):
            Circle(SKETCH20_R)
        with Locations(Location((43.5, 1.5, 0), (0, 0, 180))):
            Circle(SKETCH20_R_2, mode=Mode.SUBTRACT)
    extrude(amount=BOSS_EXTRUDE16_DEPTH)

    # Sketch21 → Boss-Extrude17 (add)
    with BuildSketch(Plane.XY.offset(23)):
        with Locations(Location((43.5, 1.5, 0), (0, 0, 180))):
            Circle(SKETCH21_R)
        with Locations((43.5, 1.5)):
            Circle(SKETCH21_R_2, mode=Mode.SUBTRACT)
    extrude(amount=-BOSS_EXTRUDE17_DEPTH)

    # Chamfer1
    chamfer1_edges = [body_3.edges().sort_by_distance(p)[0] for p in [
        (47.05, 1.5, 23),
    ]]
    chamfer(chamfer1_edges, length=CHAMFER1_SIZE)


solid = Compound([part.part, body_2.part, body_3.part])
